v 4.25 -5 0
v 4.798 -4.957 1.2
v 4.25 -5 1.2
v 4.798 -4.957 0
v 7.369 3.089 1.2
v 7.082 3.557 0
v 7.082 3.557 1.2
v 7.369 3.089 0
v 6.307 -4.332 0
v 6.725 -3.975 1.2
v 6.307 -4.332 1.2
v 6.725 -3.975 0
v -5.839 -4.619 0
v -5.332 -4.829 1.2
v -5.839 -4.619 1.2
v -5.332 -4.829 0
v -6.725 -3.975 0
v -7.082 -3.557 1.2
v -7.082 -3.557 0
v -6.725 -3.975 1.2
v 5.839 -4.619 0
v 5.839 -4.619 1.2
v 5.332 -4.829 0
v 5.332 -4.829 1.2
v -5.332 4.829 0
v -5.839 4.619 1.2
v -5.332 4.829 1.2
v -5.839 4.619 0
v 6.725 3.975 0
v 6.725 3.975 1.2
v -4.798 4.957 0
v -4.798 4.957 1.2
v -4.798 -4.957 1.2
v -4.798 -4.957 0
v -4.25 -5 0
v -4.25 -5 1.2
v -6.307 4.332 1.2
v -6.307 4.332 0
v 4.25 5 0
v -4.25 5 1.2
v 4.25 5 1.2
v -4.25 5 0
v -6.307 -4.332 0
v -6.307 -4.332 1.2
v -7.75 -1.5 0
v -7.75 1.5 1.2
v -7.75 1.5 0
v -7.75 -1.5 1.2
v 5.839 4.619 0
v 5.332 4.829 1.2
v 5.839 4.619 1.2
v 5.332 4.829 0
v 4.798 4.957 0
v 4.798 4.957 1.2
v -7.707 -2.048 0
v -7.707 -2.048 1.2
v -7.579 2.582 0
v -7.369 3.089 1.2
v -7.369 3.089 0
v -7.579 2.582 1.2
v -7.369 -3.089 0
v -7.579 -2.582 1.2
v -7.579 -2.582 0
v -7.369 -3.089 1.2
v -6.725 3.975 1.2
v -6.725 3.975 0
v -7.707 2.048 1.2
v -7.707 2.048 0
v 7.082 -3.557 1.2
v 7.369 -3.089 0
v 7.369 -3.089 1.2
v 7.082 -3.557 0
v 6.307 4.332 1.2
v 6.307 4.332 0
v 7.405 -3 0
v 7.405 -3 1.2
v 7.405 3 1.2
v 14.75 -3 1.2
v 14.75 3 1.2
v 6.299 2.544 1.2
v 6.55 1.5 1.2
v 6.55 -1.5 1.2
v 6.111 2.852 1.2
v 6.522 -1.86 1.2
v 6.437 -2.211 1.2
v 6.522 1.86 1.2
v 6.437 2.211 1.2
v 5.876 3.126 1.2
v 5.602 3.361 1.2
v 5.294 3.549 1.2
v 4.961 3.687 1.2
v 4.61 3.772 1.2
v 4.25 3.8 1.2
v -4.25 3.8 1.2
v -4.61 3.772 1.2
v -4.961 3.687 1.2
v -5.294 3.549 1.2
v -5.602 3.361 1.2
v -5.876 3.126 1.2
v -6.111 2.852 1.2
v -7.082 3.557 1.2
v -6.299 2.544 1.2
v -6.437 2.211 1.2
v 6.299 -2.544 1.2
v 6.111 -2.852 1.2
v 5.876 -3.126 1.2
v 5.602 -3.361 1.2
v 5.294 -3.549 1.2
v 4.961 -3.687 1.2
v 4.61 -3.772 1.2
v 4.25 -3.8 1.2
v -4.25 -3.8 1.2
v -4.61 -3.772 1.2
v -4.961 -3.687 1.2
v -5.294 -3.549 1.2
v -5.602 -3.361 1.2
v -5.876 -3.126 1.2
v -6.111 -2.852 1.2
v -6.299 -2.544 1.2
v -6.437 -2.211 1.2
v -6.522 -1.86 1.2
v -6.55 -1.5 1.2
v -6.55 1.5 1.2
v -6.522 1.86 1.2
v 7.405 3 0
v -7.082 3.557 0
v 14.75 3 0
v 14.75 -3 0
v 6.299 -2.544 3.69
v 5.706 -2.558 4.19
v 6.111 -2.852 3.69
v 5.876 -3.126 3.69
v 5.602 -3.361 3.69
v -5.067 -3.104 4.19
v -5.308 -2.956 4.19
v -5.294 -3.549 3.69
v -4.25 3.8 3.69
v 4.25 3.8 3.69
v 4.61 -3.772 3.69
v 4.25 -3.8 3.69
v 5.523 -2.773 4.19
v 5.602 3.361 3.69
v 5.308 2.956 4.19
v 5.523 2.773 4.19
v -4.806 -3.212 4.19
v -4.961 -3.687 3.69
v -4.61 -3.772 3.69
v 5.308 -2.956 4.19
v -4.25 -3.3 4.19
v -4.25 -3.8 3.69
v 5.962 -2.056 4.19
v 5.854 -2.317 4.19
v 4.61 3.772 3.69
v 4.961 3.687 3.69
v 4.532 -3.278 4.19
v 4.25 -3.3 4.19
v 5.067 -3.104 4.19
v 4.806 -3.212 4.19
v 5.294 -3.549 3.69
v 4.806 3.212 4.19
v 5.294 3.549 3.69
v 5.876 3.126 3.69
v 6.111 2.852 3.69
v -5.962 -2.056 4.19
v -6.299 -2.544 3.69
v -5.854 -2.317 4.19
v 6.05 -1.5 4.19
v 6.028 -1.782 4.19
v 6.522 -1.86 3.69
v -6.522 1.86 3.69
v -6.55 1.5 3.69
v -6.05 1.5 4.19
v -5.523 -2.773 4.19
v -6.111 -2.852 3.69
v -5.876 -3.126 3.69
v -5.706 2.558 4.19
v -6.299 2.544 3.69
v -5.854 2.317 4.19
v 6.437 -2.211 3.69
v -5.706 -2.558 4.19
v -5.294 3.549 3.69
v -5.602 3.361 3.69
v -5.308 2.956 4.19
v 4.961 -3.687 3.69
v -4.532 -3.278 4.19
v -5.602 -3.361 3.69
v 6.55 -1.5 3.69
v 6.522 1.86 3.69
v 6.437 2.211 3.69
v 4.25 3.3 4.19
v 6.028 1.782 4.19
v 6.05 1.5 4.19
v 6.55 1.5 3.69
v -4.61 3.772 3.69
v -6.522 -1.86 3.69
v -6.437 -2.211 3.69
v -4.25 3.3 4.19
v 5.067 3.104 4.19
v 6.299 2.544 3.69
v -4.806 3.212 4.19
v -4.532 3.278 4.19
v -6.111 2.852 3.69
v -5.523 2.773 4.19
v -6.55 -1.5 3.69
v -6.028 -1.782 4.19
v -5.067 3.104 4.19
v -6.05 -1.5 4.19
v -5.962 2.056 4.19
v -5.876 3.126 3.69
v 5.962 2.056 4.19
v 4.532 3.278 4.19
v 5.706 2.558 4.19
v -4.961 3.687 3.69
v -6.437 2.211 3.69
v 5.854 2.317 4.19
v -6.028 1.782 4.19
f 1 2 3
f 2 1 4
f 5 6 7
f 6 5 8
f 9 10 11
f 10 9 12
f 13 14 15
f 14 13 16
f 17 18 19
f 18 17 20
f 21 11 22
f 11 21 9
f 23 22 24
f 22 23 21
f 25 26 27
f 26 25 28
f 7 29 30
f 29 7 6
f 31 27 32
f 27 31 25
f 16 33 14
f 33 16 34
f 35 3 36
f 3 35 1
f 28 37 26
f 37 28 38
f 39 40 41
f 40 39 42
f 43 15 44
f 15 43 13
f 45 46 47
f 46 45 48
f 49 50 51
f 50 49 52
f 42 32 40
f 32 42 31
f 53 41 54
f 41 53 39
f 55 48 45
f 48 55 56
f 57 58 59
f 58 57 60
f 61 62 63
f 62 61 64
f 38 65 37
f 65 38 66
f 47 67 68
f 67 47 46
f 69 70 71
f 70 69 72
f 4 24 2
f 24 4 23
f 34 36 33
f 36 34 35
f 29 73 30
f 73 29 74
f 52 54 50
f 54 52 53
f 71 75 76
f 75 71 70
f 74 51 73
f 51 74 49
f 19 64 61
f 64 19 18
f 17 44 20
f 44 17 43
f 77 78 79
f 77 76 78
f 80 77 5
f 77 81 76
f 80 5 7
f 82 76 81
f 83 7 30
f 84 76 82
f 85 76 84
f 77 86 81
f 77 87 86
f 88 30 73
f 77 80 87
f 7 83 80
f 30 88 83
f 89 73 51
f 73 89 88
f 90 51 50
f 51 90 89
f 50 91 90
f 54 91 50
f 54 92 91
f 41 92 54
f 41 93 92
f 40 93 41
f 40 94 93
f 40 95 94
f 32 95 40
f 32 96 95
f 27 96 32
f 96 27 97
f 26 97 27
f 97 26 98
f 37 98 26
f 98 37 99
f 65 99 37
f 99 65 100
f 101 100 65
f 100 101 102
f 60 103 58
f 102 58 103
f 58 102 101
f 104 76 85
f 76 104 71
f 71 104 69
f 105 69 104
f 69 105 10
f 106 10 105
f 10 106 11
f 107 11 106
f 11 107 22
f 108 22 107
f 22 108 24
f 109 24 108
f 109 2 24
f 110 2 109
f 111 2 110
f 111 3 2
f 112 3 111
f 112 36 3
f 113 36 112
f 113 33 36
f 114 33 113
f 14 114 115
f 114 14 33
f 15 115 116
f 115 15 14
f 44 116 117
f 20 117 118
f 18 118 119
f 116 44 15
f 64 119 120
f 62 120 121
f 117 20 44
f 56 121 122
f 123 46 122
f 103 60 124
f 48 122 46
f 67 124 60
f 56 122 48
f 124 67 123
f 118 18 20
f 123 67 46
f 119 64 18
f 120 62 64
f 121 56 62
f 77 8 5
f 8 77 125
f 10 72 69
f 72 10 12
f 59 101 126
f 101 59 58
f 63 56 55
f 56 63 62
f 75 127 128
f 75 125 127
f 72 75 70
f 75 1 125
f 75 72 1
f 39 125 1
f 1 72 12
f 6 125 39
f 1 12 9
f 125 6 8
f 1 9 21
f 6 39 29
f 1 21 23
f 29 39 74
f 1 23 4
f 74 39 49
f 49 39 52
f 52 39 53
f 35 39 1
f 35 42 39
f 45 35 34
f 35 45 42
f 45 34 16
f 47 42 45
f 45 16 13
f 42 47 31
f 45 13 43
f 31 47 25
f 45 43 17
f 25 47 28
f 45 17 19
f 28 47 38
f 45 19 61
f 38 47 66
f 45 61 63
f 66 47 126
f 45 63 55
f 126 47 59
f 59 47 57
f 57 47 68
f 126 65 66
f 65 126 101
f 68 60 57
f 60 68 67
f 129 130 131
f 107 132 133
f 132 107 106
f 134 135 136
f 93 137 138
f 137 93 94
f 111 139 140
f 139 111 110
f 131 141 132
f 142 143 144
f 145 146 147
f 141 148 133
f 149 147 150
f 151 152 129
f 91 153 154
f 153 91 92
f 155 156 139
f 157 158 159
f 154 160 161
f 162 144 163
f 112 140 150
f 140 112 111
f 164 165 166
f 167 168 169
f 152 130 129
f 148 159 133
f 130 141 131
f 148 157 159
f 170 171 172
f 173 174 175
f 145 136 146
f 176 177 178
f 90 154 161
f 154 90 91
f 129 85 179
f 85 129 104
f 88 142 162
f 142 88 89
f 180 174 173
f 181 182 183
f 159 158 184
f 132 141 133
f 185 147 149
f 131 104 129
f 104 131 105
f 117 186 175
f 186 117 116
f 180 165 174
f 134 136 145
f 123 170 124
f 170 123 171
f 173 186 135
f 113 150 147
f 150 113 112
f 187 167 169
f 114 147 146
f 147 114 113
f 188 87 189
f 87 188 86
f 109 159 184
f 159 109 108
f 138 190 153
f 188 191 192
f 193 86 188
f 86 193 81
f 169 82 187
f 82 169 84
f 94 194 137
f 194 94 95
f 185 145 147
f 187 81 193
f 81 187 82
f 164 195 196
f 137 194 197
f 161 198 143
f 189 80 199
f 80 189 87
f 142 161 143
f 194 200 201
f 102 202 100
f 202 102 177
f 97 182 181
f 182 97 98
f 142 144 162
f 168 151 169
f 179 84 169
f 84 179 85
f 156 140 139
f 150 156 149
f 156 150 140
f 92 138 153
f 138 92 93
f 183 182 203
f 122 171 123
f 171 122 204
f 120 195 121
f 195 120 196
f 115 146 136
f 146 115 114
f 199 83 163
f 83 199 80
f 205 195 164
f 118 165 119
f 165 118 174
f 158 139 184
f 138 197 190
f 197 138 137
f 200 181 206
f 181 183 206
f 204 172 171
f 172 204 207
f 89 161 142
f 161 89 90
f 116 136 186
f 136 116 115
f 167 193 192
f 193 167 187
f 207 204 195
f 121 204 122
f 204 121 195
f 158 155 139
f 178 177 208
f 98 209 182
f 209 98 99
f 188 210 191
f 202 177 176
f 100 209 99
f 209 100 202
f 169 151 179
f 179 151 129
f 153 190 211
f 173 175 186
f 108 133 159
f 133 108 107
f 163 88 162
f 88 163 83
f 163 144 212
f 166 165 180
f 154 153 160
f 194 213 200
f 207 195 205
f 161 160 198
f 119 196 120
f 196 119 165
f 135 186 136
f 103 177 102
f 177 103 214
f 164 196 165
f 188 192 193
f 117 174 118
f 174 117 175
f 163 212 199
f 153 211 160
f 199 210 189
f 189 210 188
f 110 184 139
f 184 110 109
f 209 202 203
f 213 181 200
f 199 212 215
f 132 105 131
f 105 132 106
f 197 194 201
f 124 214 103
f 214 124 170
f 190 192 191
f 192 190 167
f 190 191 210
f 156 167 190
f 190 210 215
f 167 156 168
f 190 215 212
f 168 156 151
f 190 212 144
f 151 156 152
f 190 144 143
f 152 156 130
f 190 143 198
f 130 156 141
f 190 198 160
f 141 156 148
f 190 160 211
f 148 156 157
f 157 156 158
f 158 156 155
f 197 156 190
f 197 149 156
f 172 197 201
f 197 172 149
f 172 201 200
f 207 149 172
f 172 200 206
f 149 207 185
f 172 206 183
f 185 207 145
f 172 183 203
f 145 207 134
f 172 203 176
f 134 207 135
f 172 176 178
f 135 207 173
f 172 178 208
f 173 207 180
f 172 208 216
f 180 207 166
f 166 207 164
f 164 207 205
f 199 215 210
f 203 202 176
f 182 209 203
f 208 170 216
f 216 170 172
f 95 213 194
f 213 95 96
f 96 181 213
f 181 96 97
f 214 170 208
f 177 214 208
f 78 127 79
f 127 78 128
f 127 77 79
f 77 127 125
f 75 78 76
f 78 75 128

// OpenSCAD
include <../lib/kobo-meshcore-case-lib.scad>;
$fn = 40;
usbc_plug();
